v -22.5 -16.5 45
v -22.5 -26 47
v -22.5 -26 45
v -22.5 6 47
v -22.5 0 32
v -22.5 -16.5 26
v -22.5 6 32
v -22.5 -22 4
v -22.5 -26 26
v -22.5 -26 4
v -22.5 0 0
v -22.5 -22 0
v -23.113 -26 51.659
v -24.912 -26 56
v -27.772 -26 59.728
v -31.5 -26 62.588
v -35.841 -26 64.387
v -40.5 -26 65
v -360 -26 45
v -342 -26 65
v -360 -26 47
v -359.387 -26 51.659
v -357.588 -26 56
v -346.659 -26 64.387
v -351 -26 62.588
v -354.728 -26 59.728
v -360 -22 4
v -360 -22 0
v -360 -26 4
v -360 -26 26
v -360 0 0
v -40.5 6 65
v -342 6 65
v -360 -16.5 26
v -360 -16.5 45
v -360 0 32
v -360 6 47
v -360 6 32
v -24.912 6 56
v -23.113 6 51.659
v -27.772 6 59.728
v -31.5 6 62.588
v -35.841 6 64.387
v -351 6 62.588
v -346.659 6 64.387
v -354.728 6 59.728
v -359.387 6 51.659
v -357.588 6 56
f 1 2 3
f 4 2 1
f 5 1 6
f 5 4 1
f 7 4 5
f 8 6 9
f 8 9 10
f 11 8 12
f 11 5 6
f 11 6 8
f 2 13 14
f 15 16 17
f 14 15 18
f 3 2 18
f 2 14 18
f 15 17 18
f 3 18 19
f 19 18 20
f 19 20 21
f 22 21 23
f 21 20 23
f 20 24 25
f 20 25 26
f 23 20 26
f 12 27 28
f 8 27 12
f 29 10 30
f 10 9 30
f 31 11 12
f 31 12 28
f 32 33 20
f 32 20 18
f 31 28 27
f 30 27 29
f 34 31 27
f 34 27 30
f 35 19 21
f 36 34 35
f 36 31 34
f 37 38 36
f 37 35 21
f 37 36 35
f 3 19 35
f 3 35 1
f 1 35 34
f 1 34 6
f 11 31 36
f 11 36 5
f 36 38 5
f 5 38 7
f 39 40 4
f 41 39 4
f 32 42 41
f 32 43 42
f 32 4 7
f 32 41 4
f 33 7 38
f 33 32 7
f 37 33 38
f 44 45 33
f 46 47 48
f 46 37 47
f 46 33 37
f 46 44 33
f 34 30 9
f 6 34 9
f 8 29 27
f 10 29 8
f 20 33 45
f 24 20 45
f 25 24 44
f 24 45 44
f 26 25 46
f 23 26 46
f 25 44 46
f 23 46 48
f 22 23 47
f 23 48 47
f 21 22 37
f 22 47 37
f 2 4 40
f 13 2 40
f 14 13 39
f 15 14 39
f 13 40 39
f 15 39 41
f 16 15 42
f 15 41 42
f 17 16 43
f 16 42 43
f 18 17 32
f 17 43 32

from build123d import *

# Parameters (mm, degrees)
PAD005_DEPTH            = 32
SKETCH013_W             = 337.5
SKETCH013_H             = 19
POCKET007_DEPTH         = 9.5
SKETCH014_W             = 337.5
SKETCH014_H             = 4
POCKET008_DEPTH         = 4
SKETCH015_W             = 337.5
SKETCH015_H             = 32
POCKET009_DEPTH         = 6
BODY004_PLACEMENT_ANGLE = 90


with BuildPart() as part:
    # Sketch012 → Pad005 (new body)
    with BuildSketch(Plane.XY):
        with BuildLine():
            Line((18, 65), (319.5, 65))
            ThreePointArc((337.5, 47), (332.227922, 59.727922), (319.5, 65))
            Line((337.5, 47), (337.5, 0))
            Line((337.5, 0), (0, 0))
            Line((0, 0), (0, 47))
            ThreePointArc((18, 65), (5.272078, 59.727922), (0, 47))
        make_face()
    extrude(amount=PAD005_DEPTH)

    # Sketch013 (on Face8 of Pad005) → Pocket007 (cut)
    with BuildSketch(Plane.XY.offset(32)):
        with Locations((168.75, 35.5)):
            Rectangle(SKETCH013_W, SKETCH013_H)
    extrude(amount=-POCKET007_DEPTH, mode=Mode.SUBTRACT)

    # Sketch014 (on Face4 of Pocket007) → Pocket008 (cut)
    with BuildSketch(Plane.XY.offset(32)):
        with Locations((168.75, 2)):
            Rectangle(SKETCH014_W, SKETCH014_H)
    extrude(amount=-POCKET008_DEPTH, mode=Mode.SUBTRACT)

    # Sketch015 (on Face2 of Pocket008) → Pocket009 (cut)
    with BuildSketch(Plane(origin=(0, 0, 0), x_dir=(1, 0, 0), z_dir=(0, 0, -1))):
        with Locations((168.75, -16)):
            Rectangle(SKETCH015_W, SKETCH015_H)
    extrude(amount=-POCKET009_DEPTH, mode=Mode.SUBTRACT)


with BuildPart() as part_1:
    # Body004 placement: moved
    add(part.part.moved(Location((22.5, 6, 0))).rotate(Axis((22.5, 6, 0), (1, 0, 0)), BODY004_PLACEMENT_ANGLE))


with BuildPart() as part_2:
    # Body006 placement: moved
    add(part_1.part.moved(Location((-382.5, 0, 0))))


solid = part_2.part
